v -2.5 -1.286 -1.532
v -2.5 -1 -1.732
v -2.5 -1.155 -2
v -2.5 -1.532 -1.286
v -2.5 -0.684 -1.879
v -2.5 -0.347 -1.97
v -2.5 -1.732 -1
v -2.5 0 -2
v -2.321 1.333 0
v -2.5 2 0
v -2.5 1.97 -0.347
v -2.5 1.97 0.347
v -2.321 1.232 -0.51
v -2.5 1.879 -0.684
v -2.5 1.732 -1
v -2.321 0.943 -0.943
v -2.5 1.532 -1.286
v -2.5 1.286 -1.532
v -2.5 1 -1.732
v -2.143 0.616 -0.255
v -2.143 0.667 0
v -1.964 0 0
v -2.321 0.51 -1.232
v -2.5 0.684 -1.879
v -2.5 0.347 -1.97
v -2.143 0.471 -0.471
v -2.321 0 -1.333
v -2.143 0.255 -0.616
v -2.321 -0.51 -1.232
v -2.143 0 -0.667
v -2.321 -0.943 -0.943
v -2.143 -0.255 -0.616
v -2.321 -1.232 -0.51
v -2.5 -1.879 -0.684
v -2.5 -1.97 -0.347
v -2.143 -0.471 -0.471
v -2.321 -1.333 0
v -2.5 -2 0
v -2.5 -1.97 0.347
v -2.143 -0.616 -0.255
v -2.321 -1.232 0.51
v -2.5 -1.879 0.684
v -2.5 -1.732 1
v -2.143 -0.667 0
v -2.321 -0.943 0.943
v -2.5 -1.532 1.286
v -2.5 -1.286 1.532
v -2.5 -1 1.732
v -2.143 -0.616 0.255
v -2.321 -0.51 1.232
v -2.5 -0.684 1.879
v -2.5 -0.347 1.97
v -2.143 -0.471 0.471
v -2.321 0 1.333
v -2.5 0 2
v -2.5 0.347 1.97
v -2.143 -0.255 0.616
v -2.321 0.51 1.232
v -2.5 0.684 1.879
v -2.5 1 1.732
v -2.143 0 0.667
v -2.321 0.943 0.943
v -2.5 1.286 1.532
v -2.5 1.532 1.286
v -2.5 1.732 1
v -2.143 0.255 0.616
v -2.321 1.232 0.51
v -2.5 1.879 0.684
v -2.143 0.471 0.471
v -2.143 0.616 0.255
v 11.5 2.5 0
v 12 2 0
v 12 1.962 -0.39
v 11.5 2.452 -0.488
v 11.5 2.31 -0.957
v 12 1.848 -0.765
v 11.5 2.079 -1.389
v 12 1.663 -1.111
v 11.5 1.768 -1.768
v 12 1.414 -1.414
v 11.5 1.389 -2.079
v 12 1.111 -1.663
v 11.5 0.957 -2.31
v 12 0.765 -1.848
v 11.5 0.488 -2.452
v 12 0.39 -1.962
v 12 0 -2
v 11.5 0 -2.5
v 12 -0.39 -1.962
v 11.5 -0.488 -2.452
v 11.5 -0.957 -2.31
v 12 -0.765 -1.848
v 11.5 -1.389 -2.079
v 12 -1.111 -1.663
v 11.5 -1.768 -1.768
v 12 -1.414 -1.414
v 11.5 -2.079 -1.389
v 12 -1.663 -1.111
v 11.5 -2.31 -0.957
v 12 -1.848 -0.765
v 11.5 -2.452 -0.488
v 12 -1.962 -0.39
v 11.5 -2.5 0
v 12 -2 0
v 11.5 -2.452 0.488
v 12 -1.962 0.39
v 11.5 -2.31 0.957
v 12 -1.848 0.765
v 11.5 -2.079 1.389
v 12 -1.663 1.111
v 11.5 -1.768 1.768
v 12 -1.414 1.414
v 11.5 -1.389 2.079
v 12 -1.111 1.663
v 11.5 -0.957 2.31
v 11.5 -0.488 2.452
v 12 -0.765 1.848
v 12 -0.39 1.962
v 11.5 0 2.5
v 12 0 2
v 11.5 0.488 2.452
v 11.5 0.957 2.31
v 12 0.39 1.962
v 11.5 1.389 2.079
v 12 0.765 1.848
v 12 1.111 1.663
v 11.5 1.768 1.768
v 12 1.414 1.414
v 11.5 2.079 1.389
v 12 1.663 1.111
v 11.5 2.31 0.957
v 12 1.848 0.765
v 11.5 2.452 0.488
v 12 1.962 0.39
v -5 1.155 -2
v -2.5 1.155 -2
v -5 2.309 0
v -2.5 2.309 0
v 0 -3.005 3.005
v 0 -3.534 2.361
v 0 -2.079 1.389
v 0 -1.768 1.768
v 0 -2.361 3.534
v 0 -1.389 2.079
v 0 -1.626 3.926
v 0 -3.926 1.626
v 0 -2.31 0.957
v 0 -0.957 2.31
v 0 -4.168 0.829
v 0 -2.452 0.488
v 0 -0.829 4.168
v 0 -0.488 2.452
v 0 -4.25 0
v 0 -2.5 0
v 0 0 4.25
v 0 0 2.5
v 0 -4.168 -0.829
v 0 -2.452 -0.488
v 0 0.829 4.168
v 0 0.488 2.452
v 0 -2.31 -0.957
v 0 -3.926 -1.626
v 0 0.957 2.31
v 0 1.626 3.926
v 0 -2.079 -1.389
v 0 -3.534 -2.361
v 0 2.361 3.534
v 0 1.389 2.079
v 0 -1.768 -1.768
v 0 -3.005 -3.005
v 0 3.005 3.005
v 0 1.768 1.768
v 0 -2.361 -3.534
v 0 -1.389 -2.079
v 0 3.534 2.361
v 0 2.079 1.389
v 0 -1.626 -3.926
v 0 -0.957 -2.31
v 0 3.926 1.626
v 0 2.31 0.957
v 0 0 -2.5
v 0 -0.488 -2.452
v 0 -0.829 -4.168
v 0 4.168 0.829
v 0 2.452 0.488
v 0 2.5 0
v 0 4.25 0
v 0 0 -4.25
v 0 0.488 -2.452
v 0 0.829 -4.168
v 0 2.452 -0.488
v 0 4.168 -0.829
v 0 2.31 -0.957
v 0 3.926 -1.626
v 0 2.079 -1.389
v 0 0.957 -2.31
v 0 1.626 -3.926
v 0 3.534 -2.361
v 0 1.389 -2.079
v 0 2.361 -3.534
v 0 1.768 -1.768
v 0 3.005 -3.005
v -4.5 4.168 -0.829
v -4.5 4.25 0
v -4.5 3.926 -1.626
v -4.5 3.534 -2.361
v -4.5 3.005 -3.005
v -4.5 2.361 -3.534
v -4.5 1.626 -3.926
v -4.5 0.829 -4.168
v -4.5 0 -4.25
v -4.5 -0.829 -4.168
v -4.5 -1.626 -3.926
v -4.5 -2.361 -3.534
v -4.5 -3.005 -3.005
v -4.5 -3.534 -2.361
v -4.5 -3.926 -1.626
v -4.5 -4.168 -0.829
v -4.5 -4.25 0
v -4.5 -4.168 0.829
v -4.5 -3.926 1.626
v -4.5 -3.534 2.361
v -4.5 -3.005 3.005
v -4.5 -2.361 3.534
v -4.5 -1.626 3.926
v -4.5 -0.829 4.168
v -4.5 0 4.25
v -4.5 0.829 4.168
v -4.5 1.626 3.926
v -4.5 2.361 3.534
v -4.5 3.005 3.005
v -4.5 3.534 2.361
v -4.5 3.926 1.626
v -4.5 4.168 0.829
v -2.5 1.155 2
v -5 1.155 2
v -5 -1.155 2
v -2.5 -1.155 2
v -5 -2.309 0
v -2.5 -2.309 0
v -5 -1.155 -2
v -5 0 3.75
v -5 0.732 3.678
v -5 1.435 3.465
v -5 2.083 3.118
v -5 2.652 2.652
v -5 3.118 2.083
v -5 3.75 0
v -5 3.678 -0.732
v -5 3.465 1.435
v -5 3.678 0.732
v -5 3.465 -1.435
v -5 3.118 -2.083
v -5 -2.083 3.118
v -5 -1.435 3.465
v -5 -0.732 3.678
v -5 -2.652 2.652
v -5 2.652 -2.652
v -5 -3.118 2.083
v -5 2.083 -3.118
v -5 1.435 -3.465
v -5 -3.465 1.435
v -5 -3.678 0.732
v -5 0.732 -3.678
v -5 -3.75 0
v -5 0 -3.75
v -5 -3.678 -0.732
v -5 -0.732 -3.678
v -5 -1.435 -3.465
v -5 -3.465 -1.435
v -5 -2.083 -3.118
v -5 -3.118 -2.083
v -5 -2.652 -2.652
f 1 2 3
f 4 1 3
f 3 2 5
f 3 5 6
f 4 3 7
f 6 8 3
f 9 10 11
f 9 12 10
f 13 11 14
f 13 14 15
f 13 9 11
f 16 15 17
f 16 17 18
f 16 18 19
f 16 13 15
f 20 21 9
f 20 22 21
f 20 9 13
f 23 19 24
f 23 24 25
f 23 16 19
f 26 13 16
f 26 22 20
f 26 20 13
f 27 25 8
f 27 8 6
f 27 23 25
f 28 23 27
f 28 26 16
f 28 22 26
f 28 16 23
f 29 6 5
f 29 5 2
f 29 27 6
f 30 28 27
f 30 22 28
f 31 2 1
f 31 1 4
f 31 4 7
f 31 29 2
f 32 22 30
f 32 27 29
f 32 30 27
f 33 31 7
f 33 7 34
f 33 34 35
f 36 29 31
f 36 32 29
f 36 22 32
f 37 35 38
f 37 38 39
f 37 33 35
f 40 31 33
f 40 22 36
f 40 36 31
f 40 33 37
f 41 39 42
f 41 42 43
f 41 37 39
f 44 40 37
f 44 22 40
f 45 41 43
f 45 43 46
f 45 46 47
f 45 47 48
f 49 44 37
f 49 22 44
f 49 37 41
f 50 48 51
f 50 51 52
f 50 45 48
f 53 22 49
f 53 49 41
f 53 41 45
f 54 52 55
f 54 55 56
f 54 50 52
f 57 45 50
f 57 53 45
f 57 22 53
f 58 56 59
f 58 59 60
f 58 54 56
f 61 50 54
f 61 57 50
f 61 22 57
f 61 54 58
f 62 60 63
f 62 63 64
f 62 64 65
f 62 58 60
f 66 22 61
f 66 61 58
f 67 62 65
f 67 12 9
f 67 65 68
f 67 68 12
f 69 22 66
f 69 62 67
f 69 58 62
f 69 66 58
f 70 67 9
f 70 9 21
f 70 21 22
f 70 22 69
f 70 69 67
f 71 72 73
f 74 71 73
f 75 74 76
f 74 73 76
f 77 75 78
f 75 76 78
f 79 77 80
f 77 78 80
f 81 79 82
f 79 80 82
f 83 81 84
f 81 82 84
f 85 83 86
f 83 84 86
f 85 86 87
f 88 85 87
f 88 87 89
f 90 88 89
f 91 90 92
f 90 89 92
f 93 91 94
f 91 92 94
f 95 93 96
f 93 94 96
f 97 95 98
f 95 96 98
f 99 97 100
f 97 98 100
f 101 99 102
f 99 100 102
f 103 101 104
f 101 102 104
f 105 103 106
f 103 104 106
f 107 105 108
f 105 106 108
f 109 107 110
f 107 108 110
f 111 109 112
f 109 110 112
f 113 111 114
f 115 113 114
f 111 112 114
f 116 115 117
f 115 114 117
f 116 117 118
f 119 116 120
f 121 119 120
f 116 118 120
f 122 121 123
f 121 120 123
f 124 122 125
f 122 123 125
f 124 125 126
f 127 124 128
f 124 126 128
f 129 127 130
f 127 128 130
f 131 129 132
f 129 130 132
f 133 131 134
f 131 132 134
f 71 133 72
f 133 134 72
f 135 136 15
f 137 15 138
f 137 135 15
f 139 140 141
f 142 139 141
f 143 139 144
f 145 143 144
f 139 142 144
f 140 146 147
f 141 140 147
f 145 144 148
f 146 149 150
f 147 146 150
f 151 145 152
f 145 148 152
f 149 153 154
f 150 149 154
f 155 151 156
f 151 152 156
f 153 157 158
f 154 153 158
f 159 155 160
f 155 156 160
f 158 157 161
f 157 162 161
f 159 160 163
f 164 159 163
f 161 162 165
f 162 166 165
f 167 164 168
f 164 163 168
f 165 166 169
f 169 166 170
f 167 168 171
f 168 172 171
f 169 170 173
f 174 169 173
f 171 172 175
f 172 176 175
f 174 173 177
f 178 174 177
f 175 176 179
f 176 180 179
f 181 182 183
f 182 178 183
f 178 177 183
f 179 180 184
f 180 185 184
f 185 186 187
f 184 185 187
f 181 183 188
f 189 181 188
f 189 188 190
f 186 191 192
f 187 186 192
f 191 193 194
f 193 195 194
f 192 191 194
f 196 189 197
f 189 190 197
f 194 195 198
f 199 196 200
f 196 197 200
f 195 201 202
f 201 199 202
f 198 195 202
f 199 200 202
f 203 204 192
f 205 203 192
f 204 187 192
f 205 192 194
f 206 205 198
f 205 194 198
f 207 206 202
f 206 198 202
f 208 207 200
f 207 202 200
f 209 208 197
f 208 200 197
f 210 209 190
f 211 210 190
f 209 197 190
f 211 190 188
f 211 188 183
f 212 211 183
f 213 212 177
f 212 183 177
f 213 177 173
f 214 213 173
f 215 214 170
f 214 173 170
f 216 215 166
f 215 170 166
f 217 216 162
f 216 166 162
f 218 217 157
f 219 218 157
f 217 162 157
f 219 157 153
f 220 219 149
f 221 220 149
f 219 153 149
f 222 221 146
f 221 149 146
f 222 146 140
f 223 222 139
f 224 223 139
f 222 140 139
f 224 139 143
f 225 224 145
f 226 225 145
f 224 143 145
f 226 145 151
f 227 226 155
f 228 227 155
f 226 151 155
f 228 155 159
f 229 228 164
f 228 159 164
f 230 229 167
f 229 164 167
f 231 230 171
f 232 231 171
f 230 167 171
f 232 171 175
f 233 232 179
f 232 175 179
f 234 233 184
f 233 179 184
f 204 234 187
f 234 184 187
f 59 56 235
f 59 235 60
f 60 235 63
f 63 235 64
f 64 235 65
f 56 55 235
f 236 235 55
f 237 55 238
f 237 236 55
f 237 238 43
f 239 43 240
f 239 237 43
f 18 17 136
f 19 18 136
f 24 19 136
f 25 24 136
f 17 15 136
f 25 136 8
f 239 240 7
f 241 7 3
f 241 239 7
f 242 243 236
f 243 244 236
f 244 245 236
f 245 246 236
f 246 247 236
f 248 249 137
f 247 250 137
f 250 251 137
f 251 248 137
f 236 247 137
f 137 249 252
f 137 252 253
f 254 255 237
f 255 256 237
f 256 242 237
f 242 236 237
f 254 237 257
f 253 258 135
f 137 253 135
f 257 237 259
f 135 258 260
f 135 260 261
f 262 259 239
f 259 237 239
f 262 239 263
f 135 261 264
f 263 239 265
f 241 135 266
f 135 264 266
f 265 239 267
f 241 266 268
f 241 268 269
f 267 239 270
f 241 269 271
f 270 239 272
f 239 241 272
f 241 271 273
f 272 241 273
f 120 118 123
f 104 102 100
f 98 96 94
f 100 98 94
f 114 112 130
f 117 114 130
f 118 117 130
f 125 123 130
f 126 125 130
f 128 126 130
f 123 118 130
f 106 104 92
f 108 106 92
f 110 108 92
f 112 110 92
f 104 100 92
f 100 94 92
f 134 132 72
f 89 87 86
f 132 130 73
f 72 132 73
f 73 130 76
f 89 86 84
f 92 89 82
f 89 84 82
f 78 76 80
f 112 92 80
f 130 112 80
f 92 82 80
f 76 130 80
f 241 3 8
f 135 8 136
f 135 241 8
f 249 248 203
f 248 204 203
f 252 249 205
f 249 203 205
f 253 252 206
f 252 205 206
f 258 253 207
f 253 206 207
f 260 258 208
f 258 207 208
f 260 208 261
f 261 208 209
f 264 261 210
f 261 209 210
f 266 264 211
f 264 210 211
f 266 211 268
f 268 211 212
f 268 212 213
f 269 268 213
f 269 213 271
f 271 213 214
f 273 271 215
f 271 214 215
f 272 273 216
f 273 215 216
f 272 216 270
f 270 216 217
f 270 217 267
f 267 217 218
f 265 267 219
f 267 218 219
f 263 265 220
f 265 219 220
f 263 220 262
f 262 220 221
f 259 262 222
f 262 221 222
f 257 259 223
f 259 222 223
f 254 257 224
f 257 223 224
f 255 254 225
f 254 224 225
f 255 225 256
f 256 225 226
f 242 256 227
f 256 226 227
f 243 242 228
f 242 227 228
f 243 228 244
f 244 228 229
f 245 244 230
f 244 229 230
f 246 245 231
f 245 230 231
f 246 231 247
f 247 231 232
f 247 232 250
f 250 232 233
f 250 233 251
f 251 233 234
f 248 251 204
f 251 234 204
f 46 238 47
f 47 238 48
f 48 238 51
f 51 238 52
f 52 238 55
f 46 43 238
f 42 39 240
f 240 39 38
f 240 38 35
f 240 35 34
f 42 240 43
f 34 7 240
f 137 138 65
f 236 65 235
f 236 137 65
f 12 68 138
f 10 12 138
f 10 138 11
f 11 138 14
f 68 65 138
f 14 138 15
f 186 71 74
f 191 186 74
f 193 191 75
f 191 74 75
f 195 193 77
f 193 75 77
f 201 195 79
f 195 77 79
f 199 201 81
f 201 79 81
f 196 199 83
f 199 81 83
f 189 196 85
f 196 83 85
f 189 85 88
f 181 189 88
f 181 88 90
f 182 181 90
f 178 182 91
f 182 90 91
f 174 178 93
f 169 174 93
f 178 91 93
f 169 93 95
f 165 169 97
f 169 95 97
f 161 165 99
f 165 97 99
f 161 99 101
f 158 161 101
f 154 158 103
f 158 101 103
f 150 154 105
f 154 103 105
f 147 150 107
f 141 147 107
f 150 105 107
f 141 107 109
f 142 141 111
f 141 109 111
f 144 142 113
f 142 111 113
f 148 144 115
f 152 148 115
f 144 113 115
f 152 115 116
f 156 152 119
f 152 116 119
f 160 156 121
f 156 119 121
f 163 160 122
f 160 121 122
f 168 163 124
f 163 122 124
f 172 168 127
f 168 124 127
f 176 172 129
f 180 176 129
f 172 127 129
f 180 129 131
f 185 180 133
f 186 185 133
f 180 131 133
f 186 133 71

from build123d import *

# Parameters (mm, degrees)
CHAMFER1_SIZE      = 0.5
CUT_EXTRUDE1_DEPTH = 2.5


with BuildPart() as part:
    # Sketch1 → Revolve1 (revolve)
    with BuildSketch(Plane.XY):
        Polygon((-5, 0), (-5, 3.75), (-4.5, 4.25), (0, 4.25), (0, 2.5), (12, 2.5), (12, 0), align=None)
    revolve(axis=Axis((12, 0, 0), (-1, 0, 0)))

    # Chamfer1
    chamfer1_edges = [part.edges().sort_by_distance(p)[0] for p in [
        (12, -2.5, 0),
    ]]
    chamfer(chamfer1_edges, length=CHAMFER1_SIZE)

    # Sketch2 → Cut-Revolve1 (revolve, cut)
    with BuildSketch(Plane.XY):
        Polygon((-5, 0), (-5, 2), (-2.5, 2), (-1.964101615, 0), align=None)
    revolve(axis=Axis((-1.964101615, 0, 0), (-1, 0, 0)), mode=Mode.SUBTRACT)

    # Sketch3 → Cut-Extrude1 (cut)
    with BuildSketch(Plane(origin=(-5, 0, 0), x_dir=(0, 0, -1), z_dir=(1, 0, 0))):
        Polygon((-2, 1.154700538), (-2, -1.154700538), (0, -2.309401077), (2, -1.154700538), (2, 1.154700538), (0, 2.309401077), align=None)
    extrude(amount=CUT_EXTRUDE1_DEPTH, mode=Mode.SUBTRACT)


solid = part.part
